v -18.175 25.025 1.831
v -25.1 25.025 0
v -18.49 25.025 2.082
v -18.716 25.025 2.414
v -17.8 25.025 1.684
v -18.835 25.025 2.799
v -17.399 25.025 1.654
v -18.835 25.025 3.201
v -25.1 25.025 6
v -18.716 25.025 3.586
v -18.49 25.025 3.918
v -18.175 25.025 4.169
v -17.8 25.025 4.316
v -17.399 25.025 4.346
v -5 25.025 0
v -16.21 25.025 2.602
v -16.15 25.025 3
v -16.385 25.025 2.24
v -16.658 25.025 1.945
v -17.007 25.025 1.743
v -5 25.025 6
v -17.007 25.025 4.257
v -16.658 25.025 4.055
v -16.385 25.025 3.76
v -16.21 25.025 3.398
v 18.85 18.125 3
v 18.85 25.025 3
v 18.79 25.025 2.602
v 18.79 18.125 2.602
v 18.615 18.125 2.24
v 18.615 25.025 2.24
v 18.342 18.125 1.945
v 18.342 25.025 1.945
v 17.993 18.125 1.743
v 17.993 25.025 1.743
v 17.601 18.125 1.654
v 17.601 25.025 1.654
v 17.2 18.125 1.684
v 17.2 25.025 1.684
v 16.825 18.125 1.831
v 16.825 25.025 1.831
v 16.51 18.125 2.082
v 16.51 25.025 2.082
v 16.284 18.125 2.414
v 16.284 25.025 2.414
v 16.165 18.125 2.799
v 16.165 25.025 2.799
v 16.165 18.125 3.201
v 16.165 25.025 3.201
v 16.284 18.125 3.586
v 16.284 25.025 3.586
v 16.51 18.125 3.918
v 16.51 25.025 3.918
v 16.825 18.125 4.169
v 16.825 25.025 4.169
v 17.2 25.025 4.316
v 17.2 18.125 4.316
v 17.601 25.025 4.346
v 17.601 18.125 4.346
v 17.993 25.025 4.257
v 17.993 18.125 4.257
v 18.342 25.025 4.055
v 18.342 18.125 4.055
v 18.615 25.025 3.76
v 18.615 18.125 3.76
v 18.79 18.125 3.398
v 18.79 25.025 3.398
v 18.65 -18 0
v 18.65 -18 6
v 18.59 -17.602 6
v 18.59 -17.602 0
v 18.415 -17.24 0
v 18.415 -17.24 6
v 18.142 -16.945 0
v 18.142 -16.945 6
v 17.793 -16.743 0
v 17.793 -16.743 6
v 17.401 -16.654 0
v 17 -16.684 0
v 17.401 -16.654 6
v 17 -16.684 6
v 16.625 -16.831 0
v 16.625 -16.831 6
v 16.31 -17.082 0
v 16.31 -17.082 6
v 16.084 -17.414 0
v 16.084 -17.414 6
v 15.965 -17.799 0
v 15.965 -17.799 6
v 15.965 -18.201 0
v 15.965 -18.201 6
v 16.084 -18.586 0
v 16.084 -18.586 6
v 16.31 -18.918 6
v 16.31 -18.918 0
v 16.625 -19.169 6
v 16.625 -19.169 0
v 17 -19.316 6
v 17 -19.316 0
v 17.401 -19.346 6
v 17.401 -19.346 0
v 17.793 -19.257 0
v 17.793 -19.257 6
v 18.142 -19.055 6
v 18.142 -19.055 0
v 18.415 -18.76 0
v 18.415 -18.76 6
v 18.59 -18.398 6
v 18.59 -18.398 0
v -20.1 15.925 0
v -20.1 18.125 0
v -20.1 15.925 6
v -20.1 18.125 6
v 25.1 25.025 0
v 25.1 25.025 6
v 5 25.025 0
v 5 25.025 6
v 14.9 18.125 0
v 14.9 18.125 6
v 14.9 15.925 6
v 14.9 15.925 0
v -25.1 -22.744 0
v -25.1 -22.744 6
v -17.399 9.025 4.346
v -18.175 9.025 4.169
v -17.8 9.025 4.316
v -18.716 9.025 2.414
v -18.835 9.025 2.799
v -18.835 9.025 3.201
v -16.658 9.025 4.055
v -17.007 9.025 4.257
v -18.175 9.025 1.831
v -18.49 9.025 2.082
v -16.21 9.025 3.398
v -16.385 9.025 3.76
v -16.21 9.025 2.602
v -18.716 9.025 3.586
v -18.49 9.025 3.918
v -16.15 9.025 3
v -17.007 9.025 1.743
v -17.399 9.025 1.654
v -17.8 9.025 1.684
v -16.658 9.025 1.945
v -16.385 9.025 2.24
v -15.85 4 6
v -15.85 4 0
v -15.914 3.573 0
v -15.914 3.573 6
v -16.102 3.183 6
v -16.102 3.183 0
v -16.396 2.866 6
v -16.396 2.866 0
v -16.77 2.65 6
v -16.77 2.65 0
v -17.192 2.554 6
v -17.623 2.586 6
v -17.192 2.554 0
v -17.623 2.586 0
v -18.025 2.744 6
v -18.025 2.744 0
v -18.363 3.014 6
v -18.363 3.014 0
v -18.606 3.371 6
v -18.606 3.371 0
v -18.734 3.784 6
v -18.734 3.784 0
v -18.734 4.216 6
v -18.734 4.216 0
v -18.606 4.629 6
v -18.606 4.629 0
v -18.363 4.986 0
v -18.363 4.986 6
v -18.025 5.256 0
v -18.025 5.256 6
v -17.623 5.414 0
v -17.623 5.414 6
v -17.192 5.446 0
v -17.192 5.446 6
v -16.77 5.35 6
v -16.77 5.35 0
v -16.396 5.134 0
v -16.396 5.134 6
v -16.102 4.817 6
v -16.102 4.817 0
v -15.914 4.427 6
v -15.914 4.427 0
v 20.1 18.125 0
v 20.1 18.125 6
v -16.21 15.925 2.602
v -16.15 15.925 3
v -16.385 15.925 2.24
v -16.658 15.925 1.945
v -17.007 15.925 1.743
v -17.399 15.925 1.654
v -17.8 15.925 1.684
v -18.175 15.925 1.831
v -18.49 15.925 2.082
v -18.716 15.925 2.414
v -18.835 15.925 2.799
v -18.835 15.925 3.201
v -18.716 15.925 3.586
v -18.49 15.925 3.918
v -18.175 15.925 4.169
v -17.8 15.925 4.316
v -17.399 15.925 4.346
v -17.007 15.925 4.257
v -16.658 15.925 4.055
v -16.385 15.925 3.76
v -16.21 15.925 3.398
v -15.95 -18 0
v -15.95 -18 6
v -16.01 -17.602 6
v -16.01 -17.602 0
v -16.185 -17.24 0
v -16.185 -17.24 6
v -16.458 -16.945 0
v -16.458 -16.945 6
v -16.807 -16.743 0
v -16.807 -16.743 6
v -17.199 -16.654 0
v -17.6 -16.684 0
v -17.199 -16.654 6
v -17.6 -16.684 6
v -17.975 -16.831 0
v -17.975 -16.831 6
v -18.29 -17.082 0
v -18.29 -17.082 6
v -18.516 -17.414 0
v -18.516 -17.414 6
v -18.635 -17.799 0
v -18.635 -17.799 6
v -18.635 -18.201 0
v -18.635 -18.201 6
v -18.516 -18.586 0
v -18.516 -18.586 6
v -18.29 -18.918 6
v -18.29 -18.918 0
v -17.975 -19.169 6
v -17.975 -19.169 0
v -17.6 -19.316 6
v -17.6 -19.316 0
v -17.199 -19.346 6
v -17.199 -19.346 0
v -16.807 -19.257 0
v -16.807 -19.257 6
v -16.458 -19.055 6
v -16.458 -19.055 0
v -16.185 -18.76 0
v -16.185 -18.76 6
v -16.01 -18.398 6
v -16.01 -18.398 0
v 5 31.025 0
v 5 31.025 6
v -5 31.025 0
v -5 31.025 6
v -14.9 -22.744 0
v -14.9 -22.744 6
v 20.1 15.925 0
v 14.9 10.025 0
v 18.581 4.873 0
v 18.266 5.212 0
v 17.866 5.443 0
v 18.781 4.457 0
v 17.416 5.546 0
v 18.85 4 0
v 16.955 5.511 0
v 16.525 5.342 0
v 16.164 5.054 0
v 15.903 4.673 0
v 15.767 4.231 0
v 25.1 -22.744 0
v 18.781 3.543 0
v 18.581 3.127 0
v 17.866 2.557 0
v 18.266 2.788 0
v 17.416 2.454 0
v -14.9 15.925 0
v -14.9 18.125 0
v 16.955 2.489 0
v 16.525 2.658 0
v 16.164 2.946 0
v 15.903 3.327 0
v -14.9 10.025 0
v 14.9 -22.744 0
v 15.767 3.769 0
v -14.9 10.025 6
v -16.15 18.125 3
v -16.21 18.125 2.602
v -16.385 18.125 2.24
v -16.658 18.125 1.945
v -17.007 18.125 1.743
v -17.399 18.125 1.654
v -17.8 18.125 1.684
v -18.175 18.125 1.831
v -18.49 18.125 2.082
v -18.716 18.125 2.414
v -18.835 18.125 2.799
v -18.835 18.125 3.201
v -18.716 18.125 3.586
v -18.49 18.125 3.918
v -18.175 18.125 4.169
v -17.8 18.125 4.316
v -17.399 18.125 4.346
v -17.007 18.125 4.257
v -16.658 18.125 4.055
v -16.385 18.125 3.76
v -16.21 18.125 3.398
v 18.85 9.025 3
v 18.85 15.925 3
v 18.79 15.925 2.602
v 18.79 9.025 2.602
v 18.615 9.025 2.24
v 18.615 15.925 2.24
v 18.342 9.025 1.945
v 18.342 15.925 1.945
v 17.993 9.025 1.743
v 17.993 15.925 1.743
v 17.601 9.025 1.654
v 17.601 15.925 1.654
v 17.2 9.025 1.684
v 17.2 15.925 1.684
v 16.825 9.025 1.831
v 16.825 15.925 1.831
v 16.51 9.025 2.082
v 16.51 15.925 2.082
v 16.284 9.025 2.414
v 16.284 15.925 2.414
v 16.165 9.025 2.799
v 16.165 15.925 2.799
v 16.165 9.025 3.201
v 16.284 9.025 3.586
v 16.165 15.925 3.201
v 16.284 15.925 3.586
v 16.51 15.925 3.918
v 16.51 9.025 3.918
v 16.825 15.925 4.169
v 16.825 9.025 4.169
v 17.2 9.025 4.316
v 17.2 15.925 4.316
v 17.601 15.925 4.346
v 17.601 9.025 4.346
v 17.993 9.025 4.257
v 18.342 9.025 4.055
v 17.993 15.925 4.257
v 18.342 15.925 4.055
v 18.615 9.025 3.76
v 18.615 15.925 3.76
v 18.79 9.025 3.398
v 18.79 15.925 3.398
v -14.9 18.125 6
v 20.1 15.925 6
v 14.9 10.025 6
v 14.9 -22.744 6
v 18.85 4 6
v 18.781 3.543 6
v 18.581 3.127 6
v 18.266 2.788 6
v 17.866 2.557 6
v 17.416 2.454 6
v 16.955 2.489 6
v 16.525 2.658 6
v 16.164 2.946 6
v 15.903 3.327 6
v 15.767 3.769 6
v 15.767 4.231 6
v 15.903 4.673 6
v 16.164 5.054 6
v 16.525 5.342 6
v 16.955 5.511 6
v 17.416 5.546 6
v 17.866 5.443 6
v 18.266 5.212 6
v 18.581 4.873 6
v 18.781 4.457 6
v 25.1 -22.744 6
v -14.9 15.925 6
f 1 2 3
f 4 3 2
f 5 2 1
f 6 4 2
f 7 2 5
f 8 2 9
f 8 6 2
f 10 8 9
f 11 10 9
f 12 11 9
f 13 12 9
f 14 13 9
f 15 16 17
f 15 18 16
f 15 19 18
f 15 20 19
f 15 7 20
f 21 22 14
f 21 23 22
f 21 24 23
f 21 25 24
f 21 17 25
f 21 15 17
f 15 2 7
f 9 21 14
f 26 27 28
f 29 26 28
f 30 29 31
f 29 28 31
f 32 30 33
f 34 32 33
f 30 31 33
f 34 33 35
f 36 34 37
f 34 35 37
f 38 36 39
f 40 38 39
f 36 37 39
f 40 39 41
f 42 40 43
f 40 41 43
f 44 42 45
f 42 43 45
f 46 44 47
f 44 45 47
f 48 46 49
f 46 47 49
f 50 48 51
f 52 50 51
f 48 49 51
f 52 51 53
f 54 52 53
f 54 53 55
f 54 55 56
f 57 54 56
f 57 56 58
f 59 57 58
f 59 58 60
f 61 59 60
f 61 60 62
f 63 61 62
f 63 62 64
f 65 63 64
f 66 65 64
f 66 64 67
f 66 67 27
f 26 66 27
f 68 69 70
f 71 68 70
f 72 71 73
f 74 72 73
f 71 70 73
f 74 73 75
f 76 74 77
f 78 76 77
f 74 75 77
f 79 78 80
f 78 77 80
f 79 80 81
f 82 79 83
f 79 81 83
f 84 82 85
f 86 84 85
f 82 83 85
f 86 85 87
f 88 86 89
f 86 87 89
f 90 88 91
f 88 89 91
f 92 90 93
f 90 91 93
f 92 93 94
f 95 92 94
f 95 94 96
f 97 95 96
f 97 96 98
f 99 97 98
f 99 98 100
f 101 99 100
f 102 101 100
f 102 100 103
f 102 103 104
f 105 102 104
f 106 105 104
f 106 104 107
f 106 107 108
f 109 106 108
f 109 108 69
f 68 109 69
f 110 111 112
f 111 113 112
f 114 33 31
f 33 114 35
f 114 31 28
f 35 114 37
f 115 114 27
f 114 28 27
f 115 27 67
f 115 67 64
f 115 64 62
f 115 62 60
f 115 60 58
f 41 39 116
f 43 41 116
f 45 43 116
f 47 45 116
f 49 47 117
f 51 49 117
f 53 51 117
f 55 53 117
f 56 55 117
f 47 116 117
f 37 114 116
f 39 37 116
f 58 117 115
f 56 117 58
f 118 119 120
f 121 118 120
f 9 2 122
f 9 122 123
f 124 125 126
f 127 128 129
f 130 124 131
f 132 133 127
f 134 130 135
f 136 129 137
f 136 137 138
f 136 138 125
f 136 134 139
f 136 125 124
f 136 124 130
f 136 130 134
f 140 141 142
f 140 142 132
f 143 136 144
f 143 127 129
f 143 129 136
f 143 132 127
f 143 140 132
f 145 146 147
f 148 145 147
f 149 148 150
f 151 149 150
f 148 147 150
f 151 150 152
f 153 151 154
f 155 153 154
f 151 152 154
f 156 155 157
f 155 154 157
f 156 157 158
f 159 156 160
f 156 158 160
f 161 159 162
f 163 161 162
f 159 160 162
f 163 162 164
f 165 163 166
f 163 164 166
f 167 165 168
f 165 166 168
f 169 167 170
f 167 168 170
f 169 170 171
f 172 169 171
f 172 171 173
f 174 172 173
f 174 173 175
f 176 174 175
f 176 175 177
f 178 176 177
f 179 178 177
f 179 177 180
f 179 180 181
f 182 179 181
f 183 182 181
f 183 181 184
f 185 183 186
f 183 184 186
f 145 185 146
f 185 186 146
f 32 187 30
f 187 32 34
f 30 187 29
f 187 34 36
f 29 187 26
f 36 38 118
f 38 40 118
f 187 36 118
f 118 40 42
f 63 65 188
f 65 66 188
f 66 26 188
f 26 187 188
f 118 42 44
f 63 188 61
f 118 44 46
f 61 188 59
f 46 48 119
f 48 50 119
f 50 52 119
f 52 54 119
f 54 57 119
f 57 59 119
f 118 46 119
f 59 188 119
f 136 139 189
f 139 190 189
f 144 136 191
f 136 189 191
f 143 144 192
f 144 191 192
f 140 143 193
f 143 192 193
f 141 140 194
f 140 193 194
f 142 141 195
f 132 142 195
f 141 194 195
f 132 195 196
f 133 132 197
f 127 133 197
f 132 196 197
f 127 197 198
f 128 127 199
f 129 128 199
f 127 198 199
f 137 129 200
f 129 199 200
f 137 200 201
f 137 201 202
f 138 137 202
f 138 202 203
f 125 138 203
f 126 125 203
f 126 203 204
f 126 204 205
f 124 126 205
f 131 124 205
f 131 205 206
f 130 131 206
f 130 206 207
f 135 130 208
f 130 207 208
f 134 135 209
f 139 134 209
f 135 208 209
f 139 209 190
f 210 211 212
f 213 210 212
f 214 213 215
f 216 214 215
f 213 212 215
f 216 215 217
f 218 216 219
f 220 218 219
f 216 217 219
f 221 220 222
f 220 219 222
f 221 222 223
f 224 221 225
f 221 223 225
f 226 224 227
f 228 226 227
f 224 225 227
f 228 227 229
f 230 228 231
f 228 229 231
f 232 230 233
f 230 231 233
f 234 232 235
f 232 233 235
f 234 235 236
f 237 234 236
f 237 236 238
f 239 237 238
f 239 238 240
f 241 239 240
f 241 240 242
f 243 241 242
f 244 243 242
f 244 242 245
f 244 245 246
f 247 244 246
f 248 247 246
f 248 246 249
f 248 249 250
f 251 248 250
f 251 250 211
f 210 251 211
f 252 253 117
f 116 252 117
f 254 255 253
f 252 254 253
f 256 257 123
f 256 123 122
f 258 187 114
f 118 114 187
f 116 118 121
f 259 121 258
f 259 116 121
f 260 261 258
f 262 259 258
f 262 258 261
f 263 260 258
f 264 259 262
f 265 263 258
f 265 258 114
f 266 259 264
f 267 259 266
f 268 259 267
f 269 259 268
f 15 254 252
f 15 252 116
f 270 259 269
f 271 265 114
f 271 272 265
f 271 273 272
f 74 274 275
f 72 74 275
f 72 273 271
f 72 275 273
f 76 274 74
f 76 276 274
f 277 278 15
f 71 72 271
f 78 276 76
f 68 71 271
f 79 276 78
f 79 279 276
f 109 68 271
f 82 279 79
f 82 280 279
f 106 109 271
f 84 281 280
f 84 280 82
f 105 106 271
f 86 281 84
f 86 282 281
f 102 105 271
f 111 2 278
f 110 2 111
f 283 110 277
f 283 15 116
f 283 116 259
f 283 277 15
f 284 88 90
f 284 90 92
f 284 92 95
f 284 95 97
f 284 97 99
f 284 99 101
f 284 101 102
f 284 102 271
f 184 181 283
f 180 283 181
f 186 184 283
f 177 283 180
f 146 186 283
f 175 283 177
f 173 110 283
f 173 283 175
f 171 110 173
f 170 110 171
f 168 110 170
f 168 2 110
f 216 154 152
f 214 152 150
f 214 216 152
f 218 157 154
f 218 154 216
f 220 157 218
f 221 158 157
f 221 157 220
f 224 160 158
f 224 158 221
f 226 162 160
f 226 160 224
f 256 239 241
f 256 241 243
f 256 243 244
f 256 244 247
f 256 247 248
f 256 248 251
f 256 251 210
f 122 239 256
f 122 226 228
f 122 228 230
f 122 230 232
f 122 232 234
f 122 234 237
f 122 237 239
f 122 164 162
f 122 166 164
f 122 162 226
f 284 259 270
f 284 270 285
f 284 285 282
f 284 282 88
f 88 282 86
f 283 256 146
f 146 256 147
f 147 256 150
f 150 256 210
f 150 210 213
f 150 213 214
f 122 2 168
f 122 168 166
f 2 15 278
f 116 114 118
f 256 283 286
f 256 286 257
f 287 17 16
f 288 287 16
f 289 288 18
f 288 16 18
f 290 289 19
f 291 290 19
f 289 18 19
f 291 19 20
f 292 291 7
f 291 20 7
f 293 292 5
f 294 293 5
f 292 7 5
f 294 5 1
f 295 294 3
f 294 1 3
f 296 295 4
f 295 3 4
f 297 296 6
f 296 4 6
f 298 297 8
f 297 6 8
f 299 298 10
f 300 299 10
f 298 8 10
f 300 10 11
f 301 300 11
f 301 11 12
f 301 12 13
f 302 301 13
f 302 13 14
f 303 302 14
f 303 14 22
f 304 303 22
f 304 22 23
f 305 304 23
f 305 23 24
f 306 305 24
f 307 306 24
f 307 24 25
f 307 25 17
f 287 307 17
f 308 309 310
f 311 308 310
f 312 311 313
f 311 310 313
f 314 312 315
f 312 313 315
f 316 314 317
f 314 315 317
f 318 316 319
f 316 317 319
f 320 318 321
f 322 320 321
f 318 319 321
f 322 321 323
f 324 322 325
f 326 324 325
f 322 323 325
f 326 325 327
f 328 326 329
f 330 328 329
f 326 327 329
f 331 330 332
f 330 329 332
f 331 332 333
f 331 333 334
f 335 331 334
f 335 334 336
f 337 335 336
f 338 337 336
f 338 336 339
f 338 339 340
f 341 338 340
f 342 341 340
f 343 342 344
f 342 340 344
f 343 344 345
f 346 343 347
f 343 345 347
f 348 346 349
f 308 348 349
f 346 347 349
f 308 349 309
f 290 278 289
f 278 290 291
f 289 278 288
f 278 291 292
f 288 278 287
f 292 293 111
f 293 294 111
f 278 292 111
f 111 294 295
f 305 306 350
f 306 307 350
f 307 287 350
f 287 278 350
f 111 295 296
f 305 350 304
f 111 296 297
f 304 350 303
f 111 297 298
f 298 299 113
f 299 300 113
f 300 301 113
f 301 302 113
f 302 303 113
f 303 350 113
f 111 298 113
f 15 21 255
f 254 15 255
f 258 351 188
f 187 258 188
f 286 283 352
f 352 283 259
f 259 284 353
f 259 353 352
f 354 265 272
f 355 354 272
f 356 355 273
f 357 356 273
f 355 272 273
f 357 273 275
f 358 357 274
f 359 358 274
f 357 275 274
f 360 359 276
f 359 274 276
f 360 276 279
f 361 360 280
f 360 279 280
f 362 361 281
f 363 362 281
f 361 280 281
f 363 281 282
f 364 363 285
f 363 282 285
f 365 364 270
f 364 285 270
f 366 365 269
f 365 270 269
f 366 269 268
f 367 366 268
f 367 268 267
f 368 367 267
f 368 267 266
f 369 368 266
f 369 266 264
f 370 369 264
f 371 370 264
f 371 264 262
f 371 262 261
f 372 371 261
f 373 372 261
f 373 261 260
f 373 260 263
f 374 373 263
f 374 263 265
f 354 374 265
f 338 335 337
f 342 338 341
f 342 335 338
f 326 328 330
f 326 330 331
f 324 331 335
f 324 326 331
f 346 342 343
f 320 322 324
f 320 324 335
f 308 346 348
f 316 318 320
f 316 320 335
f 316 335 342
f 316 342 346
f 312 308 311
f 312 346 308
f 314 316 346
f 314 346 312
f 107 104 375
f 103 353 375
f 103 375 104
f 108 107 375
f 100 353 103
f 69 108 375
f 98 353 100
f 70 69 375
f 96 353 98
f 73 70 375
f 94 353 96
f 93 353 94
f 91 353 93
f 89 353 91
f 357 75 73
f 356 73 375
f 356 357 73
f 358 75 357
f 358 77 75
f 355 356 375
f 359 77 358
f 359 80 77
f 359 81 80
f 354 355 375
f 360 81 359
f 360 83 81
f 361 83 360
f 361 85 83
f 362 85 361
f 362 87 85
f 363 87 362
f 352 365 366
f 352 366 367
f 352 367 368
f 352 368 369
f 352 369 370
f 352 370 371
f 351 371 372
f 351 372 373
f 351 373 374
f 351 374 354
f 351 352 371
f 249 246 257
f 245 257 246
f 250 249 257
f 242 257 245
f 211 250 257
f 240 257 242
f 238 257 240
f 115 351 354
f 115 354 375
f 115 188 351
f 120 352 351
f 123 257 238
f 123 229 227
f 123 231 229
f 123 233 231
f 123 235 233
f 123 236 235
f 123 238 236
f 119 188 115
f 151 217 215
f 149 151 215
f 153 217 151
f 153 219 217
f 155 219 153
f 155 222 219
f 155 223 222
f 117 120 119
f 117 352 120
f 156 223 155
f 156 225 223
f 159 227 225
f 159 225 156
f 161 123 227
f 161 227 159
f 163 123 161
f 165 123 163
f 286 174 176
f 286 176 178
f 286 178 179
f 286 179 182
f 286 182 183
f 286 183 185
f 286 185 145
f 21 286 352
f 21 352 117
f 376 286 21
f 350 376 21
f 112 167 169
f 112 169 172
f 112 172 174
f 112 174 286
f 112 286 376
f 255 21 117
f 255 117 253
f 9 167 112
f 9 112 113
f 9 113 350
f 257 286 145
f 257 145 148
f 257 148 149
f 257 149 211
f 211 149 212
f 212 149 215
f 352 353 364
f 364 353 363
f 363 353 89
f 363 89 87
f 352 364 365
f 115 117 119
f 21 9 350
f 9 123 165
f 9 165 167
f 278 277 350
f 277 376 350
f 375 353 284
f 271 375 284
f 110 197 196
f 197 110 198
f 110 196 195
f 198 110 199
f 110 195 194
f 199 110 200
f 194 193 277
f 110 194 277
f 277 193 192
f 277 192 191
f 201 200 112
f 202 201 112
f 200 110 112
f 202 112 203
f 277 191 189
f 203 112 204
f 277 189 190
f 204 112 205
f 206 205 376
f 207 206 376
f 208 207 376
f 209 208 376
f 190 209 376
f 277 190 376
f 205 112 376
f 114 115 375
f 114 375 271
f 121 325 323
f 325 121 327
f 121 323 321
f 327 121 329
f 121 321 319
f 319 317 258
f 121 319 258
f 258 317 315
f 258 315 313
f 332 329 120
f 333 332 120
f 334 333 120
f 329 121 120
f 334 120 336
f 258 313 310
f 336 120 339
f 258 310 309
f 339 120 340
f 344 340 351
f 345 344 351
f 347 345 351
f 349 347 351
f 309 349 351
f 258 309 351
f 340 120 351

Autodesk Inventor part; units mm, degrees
ref_plane "YZ Plane" through (0, 0, 0) normal (1, 0, 0) x (0, 1, 0)
ref_plane "XZ Plane" through (0, 0, 0) normal (0, 1, 0) x (-1, 0, 0)
ref_plane "XY Plane" through (0, 0, 0) normal (0, 0, 1) x (1, 0, 0)
ref_plane "작업 평면1" through (0, 0, 0) normal (0, 0, 1) x (1, 0, 0)
sketch "스케치1" plane through (0, 0, 0) normal (0, 0, 1) x (1, 0, 0)
  line L0 (-20.1, 0.025) -> (-14.5, 0.025) projected
  line L1 (-20.1, -44.6) -> (-20.1, 8.5) projected
  line L2 (20.1, 0.025) -> (14.5, 0.025) projected
  line L3 (20.1, 8.5) -> (20.1, -44.6) projected
  circle A0 centre (17.3, 4) radius 1.45 projected
  circle A1 centre (-17.3, 4) radius 1.35 projected
  circle A2 centre (-17.3, 4) radius 1.45
  circle A3 centre (17.3, 4) radius 1.55
  line L4 (14.9, 0.025) -> (14.9, 15.025)
  line L5 (-14.9, 15.025) -> (-14.9, 0.025)
  line L6 (-20.1, 0.025) -> (-20.1, 15.025)
  line L7 (20.1, 0.025) -> (20.1, 15.025)
  line L8 (-20.1, 15.025) -> (20.1, 15.025)
  line L9 (-20.1, 0.025) -> (-14.9, 0.025)
  line L10 (14.9, 0.025) -> (20.1, 0.025)
  line L11 (-14.9, 0.025) -> (-14.9, 10.025)
  line L12 (-14.9, 10.025) -> (14.9, 10.025)
  line L13 (14.9, 0.025) -> (20.1, 0.025)
  point P0 (0, 0)
  point P1 (-20.1, 8.5)
  point P2 (-14.9, 0.025)
  dimension "d0" = 0.1
  dimension "d1" = 0.1
  dimension "d4" = 15
  dimension "d5" = 15
  dimension "d9" = 10
extrude "돌출1" add sketch "스케치1" along normal blind 6 contours L1 L6 L8 L5 L0 | L5 L8 L4 L12 | L4 L8 L7 L3 L2
sketch "스케치5" plane through (0, 0, 6) normal (0, 0, 1) x (1, 0, 0)
  line L0 (15, -50.5) -> (11.5, -50.5)
  line L1 (15, -50.5) -> (20.1, -44.5)
  line L2 (20.1, -44.5) -> (20.1, 8.6)
  line L3 (20.1, 8.6) -> (15, 14.6)
  line L4 (15, 14.6) -> (-15, 14.6)
  line L5 (-15, 14.6) -> (-20.1, 8.6)
  line L6 (-20.1, 8.6) -> (-20.1, -44.5)
  line L7 (-20.1, -44.5) -> (-15, -50.5)
  line L8 (-11.5, -50.5) -> (-15, -50.5)
  arc A0 (-14.5, -47.5) -> (-11.5, -50.5) centre (-11.5, -47.5) ccw
  line L9 (-14.5, 6) -> (-14.5, -47.5)
  arc A1 (-11.5, 9) -> (-14.5, 6) centre (-11.5, 6) ccw
  line L10 (11.5, 9) -> (-11.5, 9)
  arc A2 (14.5, 6) -> (11.5, 9) centre (11.5, 6) ccw
  line L11 (14.5, -47.5) -> (14.5, 6)
  arc A3 (11.5, -50.5) -> (14.5, -47.5) centre (11.5, -47.5) ccw
  circle A4 centre (-17.3, -40) radius 1.35
  circle A5 centre (-17.3, -18) radius 1.35
  circle A6 centre (-17.3, 4) radius 1.35
  circle A7 centre (-11, 11.8) radius 1.35
  circle A8 centre (17.3, -40) radius 1.35
  circle A9 centre (17.3, -18) radius 1.35
  circle A10 centre (17.3, 4) radius 1.35
  circle A11 centre (11, 11.8) radius 1.35
  line L12 (20.1, 15.025) -> (-20.1, 15.025) projected
  line L13 (-20.1, 15.025) -> (-20.1, 0.025) projected
  line L14 (-20.1, 0.025) -> (-14.9, 0.025) projected
  line L15 (-14.9, 0.025) -> (-14.9, 10.025) projected
  line L16 (-14.9, 10.025) -> (14.9, 10.025) projected
  line L17 (14.9, 10.025) -> (14.9, 0.025) projected
  line L18 (14.9, 0.025) -> (20.1, 0.025) projected
  line L19 (20.1, 0.025) -> (20.1, 15.025) projected
  circle A12 centre (17.3, 4) radius 1.55 projected
  circle A13 centre (-17.3, 4) radius 1.45 projected
  line L20 (-14.9, 15.025) -> (-26.9, 15.025)
  line L21 (-26.9, 15.025) -> (-26.9, -22.7435)
  line L22 (-26.9, -22.7435) -> (-14.9, -22.7435)
  line L23 (-14.9, -22.7435) -> (-14.9, 15.025)
  line L24 (14.9, 15.025) -> (26.9, 15.025)
  line L25 (26.9, 15.025) -> (26.9, -22.7435)
  line L26 (26.9, -22.7435) -> (14.9, -22.7435)
  line L27 (14.9, -22.7435) -> (14.9, 15.025)
  point P0 (0, 0)
  point P1 (0, -36)
  point P2 (20.1, 8.6)
  point P3 (20.1, -22.7435)
  point P4 (-20.1, -22.7435)
  point P5 (-20.1, 15.025)
  point P6 (20.1, 0.025)
  point P7 (-14.9, 0.025)
  dimension "d21" = 12
  dimension "d22" = 12
extrude "돌출5" add sketch "스케치5" against normal blind 6 contours L26 L27 L18 L2 | L23 L22 L6 L14
sketch "스케치12" plane through (0, 0, 6) normal (0, 0, 1) x (1, 0, 0)
  circle A0 centre (-17.3, -18) radius 1.35 projected
  circle A1 centre (17.3, -18) radius 1.35 projected
  line L0 (20.1, 15.025) -> (-20.1, 15.025) projected
  line L1 (-20.1, 15.025) -> (-20.1, -22.7435) projected
  line L2 (-20.1, -22.7435) -> (-14.9, -22.7435) projected
  line L3 (-14.9, -22.7435) -> (-14.9, 10.025) projected
  line L4 (-14.9, 10.025) -> (14.9, 10.025) projected
  line L5 (14.9, 10.025) -> (14.9, -22.7435) projected
  line L6 (14.9, -22.7435) -> (20.1, -22.7435) projected
  line L7 (20.1, -22.7435) -> (20.1, 15.025) projected
  circle A2 centre (17.3, 4) radius 1.55 projected
  circle A3 centre (-17.3, 4) radius 1.45 projected
  line L8 (0, 15.025) -> (-5, 15.025)
  line L9 (-5, 15.025) -> (-5, 21.025)
  line L10 (-5, 21.025) -> (0, 21.025)
  line L11 (0, 21.025) -> (0, 15.025)
  line L12 (0, 21.025) -> (5, 21.025)
  line L13 (5, 21.025) -> (5, 15.025)
  line L14 (5, 15.025) -> (0, 15.025)
  line L15 (0, 15.025) -> (0, 21.025)
  point P0 (0, 0)
  point P1 (5, 15.025)
  dimension "d53" = 5
  dimension "d54" = 6
  dimension "d55" = 5
  dimension "d56" = 6
extrude "돌출11" add sketch "스케치12" against normal blind 6 contours L0 L11 L12 L13 | L0 L9 L10 L11
sketch "스케치14" plane through (-20.1, 15.025, 6) normal (0, 1, 0) x (1, 0, 0)
  line L0 (5.2, 6) -> (5.2, 0) projected
  line L1 (15.1, 0) -> (15.1, 6) projected
  line L2 (15.1, 6) -> (0, 6) projected
  line L3 (0, 6) -> (0, 0) projected
  line L4 (15.1, 0) -> (0, 0) projected
  line L5 (25.1, 6) -> (25.1, 0) projected
  line L6 (40.2, 0) -> (25.1, 0) projected
  line L7 (40.2, 6) -> (40.2, 0) projected
  line L8 (40.2, 6) -> (25.1, 6) projected
  line L9 (35, 6) -> (35, 0) projected
  line L10 (0, 6) -> (2.6, 6)
  circle A0 centre (2.6, 3) radius 1.35
  line L11 (40.2, 6) -> (40.2, 0) projected
  line L12 (40.2, 6) -> (37.6, 6)
  circle A1 centre (37.6, 3) radius 1.35
  point P0 (20.1, 6)
  dimension "d59" = 6
  dimension "d60" = 5.2
  dimension "d61" = 2.6
  dimension "d62" = 2.7
  dimension "d63" = 2.6
  dimension "d64" = 2.7
extrude "돌출12" cut sketch "스케치14" against normal blind 6 contours A0 | A1
sketch "스케치16" plane through (-20.1, 15.025, 0) normal (-1, 0, 0) x (0, 0, 1)
  line L0 (0, 0) -> (0, -37.7685) projected
  line L1 (6, -37.7685) -> (0, -37.7685) projected
  line L2 (6, 0) -> (6, -37.7685) projected
  line L3 (0, 0) -> (6, 0) projected
  point P0 (0, -15.025)
extrude "돌출13" add sketch "스케치16" along normal blind 5
sketch "스케치18" plane through (20.1, 15.025, 6) normal (1, 0, 0) x (0, 0, -1)
  line L0 (6, 0) -> (6, -37.7685) projected
  line L1 (6, 0) -> (0, 0) projected
  line L2 (0, -37.7685) -> (0, 0) projected
  line L3 (0, -37.7685) -> (6, -37.7685) projected
  point P0 (6, -15.025)
extrude "돌출14" add sketch "스케치18" along normal blind 5
move faces "이동1" translate (0, 10, 0) faces at (8.7167, 15.025, 3) (1.6667, 21.025, 4) (-8.7167, 15.025, 3)
sketch "스케치19" plane through (0, 0, 6) normal (0, 0, 1) x (1, 0, 0)
  line L0 (-18.85, 9.025) -> (-16.15, 9.025) projected
  circle A0 centre (-17.3, 4) radius 1.45 projected
  line L1 (-14.9, 10.025) -> (14.9, 10.025) projected
  line L2 (-14.9, 10.025) -> (14.9, 10.025) projected
  circle A1 centre (-17.3, -18) radius 1.35 projected
  circle A2 centre (17.3, -18) radius 1.35 projected
  line L3 (5, 25.025) -> (25.1, 25.025) projected
  line L4 (5, 25.025) -> (5, 31.025) projected
  line L5 (5, 31.025) -> (-5, 31.025) projected
  line L6 (-5, 31.025) -> (-5, 25.025) projected
  line L7 (-5, 25.025) -> (-25.1, 25.025) projected
  line L8 (-25.1, -22.7435) -> (-25.1, 25.025) projected
  line L9 (-25.1, -22.7435) -> (-14.9, -22.7435) projected
  line L10 (-14.9, -22.7435) -> (-14.9, 10.025) projected
  line L11 (-14.9, 10.025) -> (14.9, 10.025) projected
  line L12 (14.9, 10.025) -> (14.9, -22.7435) projected
  line L13 (14.9, -22.7435) -> (25.1, -22.7435) projected
  line L14 (25.1, 25.025) -> (25.1, -22.7435) projected
  circle A3 centre (17.3, 4) radius 1.55 projected
  circle A4 centre (-17.3, 4) radius 1.45 projected
  circle A5 centre (-17.3, -18) radius 1.35 projected
  circle A6 centre (17.3, -18) radius 1.35 projected
  line L15 (25.1, 25.025) -> (5, 25.025) projected
  line L16 (25.1, -22.7435) -> (25.1, 25.025) projected
  line L17 (14.9, -22.7435) -> (25.1, -22.7435) projected
  line L18 (14.9, 10.025) -> (14.9, -22.7435) projected
  line L19 (-14.9, 10.025) -> (14.9, 10.025) projected
  line L20 (-14.9, 10.025) -> (-14.9, -22.7435) projected
  line L21 (-14.9, -22.7435) -> (-25.1, -22.7435) projected
  line L22 (-25.1, 25.025) -> (-25.1, -22.7435) projected
  line L23 (-5, 25.025) -> (-25.1, 25.025) projected
  line L24 (-5, 25.025) -> (-5, 31.025) projected
  line L25 (-5, 31.025) -> (5, 31.025) projected
  line L26 (5, 31.025) -> (5, 25.025) projected
  circle A7 centre (17.3, 4) radius 1.55 projected
  circle A8 centre (-17.3, 4) radius 1.45 projected
  line L27 (-5, 25.025) -> (-5, 31.025) projected
  line L28 (-14.9, -22.7435) -> (-14.9, 10.025) projected
  line L29 (-14.9, 10.025) -> (-14.9, -22.7435) projected
  line L30 (-14.9, 10.025) -> (-14.9, -22.7435) projected
  line L31 (-14.9, -22.7435) -> (-14.9, 10.025) projected
  circle A9 centre (-17.3, -18) radius 1.35 projected
  circle A10 centre (-17.3, -18) radius 1.35 projected
  circle A11 centre (-17.3, -18) radius 1.35 projected
  circle A12 centre (-17.3, -18) radius 1.35 projected
  circle A13 centre (-17.3, 4) radius 1.45 projected
  circle A14 centre (-17.3, 4) radius 1.45 projected
  circle A15 centre (-17.3, 4) radius 1.45 projected
  line L32 (-25.1, -22.7435) -> (-14.9, -22.7435) projected
  line L33 (-14.9, -22.7435) -> (-25.1, -22.7435) projected
  line L34 (-25.1, -22.7435) -> (-14.9, -22.7435) projected
  line L35 (-14.9, -22.7435) -> (-25.1, -22.7435) projected
  line L36 (-25.1, -22.7435) -> (-25.1, 25.025) projected
  line L37 (-25.1, 25.025) -> (-25.1, -22.7435) projected
  line L38 (-25.1, 25.025) -> (-25.1, -22.7435) projected
  line L39 (-25.1, -22.7435) -> (-25.1, 25.025) projected
  line L40 (14.9, -22.7435) -> (25.1, -22.7435) projected
  line L41 (14.9, 10.025) -> (14.9, -22.7435) projected
  line L42 (14.9, 10.025) -> (14.9, -22.7435) projected
  circle A16 centre (17.3, -18) radius 1.35 projected
  circle A17 centre (17.3, -18) radius 1.35 projected
  circle A18 centre (17.3, 4) radius 1.55 projected
  circle A19 centre (17.3, 4) radius 1.55 projected
  line L43 (16.15, 9.025) -> (18.85, 9.025) projected
  line L44 (14.9, -22.7435) -> (25.1, -22.7435) projected
  line L45 (25.1, 25.025) -> (25.1, -22.7435) projected
  line L46 (25.1, -22.7435) -> (25.1, 25.025) projected
  line L47 (25.1, -22.7435) -> (25.1, 25.025) projected
  line L48 (25.1, 25.025) -> (25.1, -22.7435) projected
  line L49 (-18.85, 9.025) -> (-16.15, 9.025) projected
  line L50 (-18.85, 25.025) -> (-16.15, 25.025) projected
  line L51 (-18.85, 9.025) -> (-16.15, 9.025) projected
  line L52 (-5, 25.025) -> (-25.1, 25.025) projected
  line L53 (-5, 25.025) -> (-25.1, 25.025) projected
  line L54 (-18.85, 25.025) -> (-16.15, 25.025) projected
  line L55 (-5, 25.025) -> (-25.1, 25.025) projected
  line L56 (-5, 25.025) -> (-25.1, 25.025) projected
  line L57 (-5, 31.025) -> (-5, 25.025) projected
  line L58 (5, 31.025) -> (-5, 31.025) projected
  line L59 (5, 31.025) -> (-5, 31.025) projected
  line L60 (-5, 31.025) -> (5, 31.025) projected
  line L61 (-5, 31.025) -> (-5, 25.025) projected
  line L62 (-5, 25.025) -> (-5, 31.025) projected
  line L63 (-18.85, 25.025) -> (-16.15, 25.025) projected
  line L64 (16.15, 25.025) -> (18.85, 25.025) projected
  line L65 (5, 25.025) -> (25.1, 25.025) projected
  line L66 (25.1, 25.025) -> (5, 25.025) projected
  line L67 (5, 31.025) -> (5, 25.025) projected
  line L68 (5, 25.025) -> (5, 31.025) projected
  line L69 (5, 25.025) -> (5, 31.025) projected
  line L70 (5, 31.025) -> (5, 25.025) projected
  line L71 (-5, 31.025) -> (5, 31.025) projected
  line L72 (14.9, -22.7435) -> (25.1, -22.7435) projected
  line L73 (14.9, -22.7435) -> (25.1, -22.7435) projected
  line L74 (-14.9, 10.025) -> (14.9, 10.025) projected
  line L75 (-14.9, 10.025) -> (14.9, 10.025) projected
  circle A20 centre (17.3, -18) radius 1.35 projected
  circle A21 centre (17.3, -18) radius 1.35 projected
  line L76 (14.9, 10.025) -> (14.9, -22.7435) projected
  line L77 (14.9, 10.025) -> (14.9, -22.7435) projected
  line L78 (16.15, 9.025) -> (18.85, 9.025) projected
  line L79 (16.15, 25.025) -> (18.85, 25.025) projected
  line L80 (16.15, 25.025) -> (18.85, 25.025) projected
  line L81 (5, 25.025) -> (25.1, 25.025) projected
  line L82 (25.1, 25.025) -> (5, 25.025) projected
  circle A22 centre (17.3, 4) radius 1.55 projected
  circle A23 centre (17.3, 4) radius 1.55 projected
  line L83 (16.15, 9.025) -> (18.85, 9.025) projected
  line L84 (-18.85, 25.025) -> (-18.85, 9.025) projected
  line L85 (-16.15, 25.025) -> (-16.15, 9.025) projected
  line L86 (16.15, 25.025) -> (16.15, 9.025) projected
  line L87 (18.85, 25.025) -> (18.85, 9.025) projected
  line L88 (-20.1, 15.925) -> (-14.9, 15.925)
  line L89 (-14.9, 15.925) -> (-14.9, 18.125)
  line L90 (-14.9, 18.125) -> (-20.1, 18.125)
  line L91 (-20.1, 18.125) -> (-20.1, 15.925)
  line L92 (-20.1, 15.925) -> (-14.9, 18.125) construction
  line L93 (-14.9, 15.925) -> (-20.1, 18.125) construction
  line L94 (14.9, 15.925) -> (20.1, 15.925)
  line L95 (20.1, 15.925) -> (20.1, 18.125)
  line L96 (20.1, 18.125) -> (14.9, 18.125)
  line L97 (14.9, 18.125) -> (14.9, 15.925)
  line L98 (14.9, 15.925) -> (20.1, 18.125) construction
  line L99 (20.1, 15.925) -> (14.9, 18.125) construction
  point P0 (0, 0)
  point P1 (-17.5, 17.025)
  point P2 (17.5, 17.025)
  dimension "d74" = 5.2
  dimension "d75" = 2.2
  dimension "d76" = 5.2
  dimension "d77" = 2.2
extrude "돌출15" cut sketch "스케치19" against normal blind 10 contours L88 L91 L90 L84 | L84 L90 L85 L88 | L85 L90 L89 L88 | L96 L87 L94 L86 | L86 L94 L97 L96 | L96 L95 L94 L87
properties part number "frame_knee_to_bridge" material "PMMA 플라스틱"
